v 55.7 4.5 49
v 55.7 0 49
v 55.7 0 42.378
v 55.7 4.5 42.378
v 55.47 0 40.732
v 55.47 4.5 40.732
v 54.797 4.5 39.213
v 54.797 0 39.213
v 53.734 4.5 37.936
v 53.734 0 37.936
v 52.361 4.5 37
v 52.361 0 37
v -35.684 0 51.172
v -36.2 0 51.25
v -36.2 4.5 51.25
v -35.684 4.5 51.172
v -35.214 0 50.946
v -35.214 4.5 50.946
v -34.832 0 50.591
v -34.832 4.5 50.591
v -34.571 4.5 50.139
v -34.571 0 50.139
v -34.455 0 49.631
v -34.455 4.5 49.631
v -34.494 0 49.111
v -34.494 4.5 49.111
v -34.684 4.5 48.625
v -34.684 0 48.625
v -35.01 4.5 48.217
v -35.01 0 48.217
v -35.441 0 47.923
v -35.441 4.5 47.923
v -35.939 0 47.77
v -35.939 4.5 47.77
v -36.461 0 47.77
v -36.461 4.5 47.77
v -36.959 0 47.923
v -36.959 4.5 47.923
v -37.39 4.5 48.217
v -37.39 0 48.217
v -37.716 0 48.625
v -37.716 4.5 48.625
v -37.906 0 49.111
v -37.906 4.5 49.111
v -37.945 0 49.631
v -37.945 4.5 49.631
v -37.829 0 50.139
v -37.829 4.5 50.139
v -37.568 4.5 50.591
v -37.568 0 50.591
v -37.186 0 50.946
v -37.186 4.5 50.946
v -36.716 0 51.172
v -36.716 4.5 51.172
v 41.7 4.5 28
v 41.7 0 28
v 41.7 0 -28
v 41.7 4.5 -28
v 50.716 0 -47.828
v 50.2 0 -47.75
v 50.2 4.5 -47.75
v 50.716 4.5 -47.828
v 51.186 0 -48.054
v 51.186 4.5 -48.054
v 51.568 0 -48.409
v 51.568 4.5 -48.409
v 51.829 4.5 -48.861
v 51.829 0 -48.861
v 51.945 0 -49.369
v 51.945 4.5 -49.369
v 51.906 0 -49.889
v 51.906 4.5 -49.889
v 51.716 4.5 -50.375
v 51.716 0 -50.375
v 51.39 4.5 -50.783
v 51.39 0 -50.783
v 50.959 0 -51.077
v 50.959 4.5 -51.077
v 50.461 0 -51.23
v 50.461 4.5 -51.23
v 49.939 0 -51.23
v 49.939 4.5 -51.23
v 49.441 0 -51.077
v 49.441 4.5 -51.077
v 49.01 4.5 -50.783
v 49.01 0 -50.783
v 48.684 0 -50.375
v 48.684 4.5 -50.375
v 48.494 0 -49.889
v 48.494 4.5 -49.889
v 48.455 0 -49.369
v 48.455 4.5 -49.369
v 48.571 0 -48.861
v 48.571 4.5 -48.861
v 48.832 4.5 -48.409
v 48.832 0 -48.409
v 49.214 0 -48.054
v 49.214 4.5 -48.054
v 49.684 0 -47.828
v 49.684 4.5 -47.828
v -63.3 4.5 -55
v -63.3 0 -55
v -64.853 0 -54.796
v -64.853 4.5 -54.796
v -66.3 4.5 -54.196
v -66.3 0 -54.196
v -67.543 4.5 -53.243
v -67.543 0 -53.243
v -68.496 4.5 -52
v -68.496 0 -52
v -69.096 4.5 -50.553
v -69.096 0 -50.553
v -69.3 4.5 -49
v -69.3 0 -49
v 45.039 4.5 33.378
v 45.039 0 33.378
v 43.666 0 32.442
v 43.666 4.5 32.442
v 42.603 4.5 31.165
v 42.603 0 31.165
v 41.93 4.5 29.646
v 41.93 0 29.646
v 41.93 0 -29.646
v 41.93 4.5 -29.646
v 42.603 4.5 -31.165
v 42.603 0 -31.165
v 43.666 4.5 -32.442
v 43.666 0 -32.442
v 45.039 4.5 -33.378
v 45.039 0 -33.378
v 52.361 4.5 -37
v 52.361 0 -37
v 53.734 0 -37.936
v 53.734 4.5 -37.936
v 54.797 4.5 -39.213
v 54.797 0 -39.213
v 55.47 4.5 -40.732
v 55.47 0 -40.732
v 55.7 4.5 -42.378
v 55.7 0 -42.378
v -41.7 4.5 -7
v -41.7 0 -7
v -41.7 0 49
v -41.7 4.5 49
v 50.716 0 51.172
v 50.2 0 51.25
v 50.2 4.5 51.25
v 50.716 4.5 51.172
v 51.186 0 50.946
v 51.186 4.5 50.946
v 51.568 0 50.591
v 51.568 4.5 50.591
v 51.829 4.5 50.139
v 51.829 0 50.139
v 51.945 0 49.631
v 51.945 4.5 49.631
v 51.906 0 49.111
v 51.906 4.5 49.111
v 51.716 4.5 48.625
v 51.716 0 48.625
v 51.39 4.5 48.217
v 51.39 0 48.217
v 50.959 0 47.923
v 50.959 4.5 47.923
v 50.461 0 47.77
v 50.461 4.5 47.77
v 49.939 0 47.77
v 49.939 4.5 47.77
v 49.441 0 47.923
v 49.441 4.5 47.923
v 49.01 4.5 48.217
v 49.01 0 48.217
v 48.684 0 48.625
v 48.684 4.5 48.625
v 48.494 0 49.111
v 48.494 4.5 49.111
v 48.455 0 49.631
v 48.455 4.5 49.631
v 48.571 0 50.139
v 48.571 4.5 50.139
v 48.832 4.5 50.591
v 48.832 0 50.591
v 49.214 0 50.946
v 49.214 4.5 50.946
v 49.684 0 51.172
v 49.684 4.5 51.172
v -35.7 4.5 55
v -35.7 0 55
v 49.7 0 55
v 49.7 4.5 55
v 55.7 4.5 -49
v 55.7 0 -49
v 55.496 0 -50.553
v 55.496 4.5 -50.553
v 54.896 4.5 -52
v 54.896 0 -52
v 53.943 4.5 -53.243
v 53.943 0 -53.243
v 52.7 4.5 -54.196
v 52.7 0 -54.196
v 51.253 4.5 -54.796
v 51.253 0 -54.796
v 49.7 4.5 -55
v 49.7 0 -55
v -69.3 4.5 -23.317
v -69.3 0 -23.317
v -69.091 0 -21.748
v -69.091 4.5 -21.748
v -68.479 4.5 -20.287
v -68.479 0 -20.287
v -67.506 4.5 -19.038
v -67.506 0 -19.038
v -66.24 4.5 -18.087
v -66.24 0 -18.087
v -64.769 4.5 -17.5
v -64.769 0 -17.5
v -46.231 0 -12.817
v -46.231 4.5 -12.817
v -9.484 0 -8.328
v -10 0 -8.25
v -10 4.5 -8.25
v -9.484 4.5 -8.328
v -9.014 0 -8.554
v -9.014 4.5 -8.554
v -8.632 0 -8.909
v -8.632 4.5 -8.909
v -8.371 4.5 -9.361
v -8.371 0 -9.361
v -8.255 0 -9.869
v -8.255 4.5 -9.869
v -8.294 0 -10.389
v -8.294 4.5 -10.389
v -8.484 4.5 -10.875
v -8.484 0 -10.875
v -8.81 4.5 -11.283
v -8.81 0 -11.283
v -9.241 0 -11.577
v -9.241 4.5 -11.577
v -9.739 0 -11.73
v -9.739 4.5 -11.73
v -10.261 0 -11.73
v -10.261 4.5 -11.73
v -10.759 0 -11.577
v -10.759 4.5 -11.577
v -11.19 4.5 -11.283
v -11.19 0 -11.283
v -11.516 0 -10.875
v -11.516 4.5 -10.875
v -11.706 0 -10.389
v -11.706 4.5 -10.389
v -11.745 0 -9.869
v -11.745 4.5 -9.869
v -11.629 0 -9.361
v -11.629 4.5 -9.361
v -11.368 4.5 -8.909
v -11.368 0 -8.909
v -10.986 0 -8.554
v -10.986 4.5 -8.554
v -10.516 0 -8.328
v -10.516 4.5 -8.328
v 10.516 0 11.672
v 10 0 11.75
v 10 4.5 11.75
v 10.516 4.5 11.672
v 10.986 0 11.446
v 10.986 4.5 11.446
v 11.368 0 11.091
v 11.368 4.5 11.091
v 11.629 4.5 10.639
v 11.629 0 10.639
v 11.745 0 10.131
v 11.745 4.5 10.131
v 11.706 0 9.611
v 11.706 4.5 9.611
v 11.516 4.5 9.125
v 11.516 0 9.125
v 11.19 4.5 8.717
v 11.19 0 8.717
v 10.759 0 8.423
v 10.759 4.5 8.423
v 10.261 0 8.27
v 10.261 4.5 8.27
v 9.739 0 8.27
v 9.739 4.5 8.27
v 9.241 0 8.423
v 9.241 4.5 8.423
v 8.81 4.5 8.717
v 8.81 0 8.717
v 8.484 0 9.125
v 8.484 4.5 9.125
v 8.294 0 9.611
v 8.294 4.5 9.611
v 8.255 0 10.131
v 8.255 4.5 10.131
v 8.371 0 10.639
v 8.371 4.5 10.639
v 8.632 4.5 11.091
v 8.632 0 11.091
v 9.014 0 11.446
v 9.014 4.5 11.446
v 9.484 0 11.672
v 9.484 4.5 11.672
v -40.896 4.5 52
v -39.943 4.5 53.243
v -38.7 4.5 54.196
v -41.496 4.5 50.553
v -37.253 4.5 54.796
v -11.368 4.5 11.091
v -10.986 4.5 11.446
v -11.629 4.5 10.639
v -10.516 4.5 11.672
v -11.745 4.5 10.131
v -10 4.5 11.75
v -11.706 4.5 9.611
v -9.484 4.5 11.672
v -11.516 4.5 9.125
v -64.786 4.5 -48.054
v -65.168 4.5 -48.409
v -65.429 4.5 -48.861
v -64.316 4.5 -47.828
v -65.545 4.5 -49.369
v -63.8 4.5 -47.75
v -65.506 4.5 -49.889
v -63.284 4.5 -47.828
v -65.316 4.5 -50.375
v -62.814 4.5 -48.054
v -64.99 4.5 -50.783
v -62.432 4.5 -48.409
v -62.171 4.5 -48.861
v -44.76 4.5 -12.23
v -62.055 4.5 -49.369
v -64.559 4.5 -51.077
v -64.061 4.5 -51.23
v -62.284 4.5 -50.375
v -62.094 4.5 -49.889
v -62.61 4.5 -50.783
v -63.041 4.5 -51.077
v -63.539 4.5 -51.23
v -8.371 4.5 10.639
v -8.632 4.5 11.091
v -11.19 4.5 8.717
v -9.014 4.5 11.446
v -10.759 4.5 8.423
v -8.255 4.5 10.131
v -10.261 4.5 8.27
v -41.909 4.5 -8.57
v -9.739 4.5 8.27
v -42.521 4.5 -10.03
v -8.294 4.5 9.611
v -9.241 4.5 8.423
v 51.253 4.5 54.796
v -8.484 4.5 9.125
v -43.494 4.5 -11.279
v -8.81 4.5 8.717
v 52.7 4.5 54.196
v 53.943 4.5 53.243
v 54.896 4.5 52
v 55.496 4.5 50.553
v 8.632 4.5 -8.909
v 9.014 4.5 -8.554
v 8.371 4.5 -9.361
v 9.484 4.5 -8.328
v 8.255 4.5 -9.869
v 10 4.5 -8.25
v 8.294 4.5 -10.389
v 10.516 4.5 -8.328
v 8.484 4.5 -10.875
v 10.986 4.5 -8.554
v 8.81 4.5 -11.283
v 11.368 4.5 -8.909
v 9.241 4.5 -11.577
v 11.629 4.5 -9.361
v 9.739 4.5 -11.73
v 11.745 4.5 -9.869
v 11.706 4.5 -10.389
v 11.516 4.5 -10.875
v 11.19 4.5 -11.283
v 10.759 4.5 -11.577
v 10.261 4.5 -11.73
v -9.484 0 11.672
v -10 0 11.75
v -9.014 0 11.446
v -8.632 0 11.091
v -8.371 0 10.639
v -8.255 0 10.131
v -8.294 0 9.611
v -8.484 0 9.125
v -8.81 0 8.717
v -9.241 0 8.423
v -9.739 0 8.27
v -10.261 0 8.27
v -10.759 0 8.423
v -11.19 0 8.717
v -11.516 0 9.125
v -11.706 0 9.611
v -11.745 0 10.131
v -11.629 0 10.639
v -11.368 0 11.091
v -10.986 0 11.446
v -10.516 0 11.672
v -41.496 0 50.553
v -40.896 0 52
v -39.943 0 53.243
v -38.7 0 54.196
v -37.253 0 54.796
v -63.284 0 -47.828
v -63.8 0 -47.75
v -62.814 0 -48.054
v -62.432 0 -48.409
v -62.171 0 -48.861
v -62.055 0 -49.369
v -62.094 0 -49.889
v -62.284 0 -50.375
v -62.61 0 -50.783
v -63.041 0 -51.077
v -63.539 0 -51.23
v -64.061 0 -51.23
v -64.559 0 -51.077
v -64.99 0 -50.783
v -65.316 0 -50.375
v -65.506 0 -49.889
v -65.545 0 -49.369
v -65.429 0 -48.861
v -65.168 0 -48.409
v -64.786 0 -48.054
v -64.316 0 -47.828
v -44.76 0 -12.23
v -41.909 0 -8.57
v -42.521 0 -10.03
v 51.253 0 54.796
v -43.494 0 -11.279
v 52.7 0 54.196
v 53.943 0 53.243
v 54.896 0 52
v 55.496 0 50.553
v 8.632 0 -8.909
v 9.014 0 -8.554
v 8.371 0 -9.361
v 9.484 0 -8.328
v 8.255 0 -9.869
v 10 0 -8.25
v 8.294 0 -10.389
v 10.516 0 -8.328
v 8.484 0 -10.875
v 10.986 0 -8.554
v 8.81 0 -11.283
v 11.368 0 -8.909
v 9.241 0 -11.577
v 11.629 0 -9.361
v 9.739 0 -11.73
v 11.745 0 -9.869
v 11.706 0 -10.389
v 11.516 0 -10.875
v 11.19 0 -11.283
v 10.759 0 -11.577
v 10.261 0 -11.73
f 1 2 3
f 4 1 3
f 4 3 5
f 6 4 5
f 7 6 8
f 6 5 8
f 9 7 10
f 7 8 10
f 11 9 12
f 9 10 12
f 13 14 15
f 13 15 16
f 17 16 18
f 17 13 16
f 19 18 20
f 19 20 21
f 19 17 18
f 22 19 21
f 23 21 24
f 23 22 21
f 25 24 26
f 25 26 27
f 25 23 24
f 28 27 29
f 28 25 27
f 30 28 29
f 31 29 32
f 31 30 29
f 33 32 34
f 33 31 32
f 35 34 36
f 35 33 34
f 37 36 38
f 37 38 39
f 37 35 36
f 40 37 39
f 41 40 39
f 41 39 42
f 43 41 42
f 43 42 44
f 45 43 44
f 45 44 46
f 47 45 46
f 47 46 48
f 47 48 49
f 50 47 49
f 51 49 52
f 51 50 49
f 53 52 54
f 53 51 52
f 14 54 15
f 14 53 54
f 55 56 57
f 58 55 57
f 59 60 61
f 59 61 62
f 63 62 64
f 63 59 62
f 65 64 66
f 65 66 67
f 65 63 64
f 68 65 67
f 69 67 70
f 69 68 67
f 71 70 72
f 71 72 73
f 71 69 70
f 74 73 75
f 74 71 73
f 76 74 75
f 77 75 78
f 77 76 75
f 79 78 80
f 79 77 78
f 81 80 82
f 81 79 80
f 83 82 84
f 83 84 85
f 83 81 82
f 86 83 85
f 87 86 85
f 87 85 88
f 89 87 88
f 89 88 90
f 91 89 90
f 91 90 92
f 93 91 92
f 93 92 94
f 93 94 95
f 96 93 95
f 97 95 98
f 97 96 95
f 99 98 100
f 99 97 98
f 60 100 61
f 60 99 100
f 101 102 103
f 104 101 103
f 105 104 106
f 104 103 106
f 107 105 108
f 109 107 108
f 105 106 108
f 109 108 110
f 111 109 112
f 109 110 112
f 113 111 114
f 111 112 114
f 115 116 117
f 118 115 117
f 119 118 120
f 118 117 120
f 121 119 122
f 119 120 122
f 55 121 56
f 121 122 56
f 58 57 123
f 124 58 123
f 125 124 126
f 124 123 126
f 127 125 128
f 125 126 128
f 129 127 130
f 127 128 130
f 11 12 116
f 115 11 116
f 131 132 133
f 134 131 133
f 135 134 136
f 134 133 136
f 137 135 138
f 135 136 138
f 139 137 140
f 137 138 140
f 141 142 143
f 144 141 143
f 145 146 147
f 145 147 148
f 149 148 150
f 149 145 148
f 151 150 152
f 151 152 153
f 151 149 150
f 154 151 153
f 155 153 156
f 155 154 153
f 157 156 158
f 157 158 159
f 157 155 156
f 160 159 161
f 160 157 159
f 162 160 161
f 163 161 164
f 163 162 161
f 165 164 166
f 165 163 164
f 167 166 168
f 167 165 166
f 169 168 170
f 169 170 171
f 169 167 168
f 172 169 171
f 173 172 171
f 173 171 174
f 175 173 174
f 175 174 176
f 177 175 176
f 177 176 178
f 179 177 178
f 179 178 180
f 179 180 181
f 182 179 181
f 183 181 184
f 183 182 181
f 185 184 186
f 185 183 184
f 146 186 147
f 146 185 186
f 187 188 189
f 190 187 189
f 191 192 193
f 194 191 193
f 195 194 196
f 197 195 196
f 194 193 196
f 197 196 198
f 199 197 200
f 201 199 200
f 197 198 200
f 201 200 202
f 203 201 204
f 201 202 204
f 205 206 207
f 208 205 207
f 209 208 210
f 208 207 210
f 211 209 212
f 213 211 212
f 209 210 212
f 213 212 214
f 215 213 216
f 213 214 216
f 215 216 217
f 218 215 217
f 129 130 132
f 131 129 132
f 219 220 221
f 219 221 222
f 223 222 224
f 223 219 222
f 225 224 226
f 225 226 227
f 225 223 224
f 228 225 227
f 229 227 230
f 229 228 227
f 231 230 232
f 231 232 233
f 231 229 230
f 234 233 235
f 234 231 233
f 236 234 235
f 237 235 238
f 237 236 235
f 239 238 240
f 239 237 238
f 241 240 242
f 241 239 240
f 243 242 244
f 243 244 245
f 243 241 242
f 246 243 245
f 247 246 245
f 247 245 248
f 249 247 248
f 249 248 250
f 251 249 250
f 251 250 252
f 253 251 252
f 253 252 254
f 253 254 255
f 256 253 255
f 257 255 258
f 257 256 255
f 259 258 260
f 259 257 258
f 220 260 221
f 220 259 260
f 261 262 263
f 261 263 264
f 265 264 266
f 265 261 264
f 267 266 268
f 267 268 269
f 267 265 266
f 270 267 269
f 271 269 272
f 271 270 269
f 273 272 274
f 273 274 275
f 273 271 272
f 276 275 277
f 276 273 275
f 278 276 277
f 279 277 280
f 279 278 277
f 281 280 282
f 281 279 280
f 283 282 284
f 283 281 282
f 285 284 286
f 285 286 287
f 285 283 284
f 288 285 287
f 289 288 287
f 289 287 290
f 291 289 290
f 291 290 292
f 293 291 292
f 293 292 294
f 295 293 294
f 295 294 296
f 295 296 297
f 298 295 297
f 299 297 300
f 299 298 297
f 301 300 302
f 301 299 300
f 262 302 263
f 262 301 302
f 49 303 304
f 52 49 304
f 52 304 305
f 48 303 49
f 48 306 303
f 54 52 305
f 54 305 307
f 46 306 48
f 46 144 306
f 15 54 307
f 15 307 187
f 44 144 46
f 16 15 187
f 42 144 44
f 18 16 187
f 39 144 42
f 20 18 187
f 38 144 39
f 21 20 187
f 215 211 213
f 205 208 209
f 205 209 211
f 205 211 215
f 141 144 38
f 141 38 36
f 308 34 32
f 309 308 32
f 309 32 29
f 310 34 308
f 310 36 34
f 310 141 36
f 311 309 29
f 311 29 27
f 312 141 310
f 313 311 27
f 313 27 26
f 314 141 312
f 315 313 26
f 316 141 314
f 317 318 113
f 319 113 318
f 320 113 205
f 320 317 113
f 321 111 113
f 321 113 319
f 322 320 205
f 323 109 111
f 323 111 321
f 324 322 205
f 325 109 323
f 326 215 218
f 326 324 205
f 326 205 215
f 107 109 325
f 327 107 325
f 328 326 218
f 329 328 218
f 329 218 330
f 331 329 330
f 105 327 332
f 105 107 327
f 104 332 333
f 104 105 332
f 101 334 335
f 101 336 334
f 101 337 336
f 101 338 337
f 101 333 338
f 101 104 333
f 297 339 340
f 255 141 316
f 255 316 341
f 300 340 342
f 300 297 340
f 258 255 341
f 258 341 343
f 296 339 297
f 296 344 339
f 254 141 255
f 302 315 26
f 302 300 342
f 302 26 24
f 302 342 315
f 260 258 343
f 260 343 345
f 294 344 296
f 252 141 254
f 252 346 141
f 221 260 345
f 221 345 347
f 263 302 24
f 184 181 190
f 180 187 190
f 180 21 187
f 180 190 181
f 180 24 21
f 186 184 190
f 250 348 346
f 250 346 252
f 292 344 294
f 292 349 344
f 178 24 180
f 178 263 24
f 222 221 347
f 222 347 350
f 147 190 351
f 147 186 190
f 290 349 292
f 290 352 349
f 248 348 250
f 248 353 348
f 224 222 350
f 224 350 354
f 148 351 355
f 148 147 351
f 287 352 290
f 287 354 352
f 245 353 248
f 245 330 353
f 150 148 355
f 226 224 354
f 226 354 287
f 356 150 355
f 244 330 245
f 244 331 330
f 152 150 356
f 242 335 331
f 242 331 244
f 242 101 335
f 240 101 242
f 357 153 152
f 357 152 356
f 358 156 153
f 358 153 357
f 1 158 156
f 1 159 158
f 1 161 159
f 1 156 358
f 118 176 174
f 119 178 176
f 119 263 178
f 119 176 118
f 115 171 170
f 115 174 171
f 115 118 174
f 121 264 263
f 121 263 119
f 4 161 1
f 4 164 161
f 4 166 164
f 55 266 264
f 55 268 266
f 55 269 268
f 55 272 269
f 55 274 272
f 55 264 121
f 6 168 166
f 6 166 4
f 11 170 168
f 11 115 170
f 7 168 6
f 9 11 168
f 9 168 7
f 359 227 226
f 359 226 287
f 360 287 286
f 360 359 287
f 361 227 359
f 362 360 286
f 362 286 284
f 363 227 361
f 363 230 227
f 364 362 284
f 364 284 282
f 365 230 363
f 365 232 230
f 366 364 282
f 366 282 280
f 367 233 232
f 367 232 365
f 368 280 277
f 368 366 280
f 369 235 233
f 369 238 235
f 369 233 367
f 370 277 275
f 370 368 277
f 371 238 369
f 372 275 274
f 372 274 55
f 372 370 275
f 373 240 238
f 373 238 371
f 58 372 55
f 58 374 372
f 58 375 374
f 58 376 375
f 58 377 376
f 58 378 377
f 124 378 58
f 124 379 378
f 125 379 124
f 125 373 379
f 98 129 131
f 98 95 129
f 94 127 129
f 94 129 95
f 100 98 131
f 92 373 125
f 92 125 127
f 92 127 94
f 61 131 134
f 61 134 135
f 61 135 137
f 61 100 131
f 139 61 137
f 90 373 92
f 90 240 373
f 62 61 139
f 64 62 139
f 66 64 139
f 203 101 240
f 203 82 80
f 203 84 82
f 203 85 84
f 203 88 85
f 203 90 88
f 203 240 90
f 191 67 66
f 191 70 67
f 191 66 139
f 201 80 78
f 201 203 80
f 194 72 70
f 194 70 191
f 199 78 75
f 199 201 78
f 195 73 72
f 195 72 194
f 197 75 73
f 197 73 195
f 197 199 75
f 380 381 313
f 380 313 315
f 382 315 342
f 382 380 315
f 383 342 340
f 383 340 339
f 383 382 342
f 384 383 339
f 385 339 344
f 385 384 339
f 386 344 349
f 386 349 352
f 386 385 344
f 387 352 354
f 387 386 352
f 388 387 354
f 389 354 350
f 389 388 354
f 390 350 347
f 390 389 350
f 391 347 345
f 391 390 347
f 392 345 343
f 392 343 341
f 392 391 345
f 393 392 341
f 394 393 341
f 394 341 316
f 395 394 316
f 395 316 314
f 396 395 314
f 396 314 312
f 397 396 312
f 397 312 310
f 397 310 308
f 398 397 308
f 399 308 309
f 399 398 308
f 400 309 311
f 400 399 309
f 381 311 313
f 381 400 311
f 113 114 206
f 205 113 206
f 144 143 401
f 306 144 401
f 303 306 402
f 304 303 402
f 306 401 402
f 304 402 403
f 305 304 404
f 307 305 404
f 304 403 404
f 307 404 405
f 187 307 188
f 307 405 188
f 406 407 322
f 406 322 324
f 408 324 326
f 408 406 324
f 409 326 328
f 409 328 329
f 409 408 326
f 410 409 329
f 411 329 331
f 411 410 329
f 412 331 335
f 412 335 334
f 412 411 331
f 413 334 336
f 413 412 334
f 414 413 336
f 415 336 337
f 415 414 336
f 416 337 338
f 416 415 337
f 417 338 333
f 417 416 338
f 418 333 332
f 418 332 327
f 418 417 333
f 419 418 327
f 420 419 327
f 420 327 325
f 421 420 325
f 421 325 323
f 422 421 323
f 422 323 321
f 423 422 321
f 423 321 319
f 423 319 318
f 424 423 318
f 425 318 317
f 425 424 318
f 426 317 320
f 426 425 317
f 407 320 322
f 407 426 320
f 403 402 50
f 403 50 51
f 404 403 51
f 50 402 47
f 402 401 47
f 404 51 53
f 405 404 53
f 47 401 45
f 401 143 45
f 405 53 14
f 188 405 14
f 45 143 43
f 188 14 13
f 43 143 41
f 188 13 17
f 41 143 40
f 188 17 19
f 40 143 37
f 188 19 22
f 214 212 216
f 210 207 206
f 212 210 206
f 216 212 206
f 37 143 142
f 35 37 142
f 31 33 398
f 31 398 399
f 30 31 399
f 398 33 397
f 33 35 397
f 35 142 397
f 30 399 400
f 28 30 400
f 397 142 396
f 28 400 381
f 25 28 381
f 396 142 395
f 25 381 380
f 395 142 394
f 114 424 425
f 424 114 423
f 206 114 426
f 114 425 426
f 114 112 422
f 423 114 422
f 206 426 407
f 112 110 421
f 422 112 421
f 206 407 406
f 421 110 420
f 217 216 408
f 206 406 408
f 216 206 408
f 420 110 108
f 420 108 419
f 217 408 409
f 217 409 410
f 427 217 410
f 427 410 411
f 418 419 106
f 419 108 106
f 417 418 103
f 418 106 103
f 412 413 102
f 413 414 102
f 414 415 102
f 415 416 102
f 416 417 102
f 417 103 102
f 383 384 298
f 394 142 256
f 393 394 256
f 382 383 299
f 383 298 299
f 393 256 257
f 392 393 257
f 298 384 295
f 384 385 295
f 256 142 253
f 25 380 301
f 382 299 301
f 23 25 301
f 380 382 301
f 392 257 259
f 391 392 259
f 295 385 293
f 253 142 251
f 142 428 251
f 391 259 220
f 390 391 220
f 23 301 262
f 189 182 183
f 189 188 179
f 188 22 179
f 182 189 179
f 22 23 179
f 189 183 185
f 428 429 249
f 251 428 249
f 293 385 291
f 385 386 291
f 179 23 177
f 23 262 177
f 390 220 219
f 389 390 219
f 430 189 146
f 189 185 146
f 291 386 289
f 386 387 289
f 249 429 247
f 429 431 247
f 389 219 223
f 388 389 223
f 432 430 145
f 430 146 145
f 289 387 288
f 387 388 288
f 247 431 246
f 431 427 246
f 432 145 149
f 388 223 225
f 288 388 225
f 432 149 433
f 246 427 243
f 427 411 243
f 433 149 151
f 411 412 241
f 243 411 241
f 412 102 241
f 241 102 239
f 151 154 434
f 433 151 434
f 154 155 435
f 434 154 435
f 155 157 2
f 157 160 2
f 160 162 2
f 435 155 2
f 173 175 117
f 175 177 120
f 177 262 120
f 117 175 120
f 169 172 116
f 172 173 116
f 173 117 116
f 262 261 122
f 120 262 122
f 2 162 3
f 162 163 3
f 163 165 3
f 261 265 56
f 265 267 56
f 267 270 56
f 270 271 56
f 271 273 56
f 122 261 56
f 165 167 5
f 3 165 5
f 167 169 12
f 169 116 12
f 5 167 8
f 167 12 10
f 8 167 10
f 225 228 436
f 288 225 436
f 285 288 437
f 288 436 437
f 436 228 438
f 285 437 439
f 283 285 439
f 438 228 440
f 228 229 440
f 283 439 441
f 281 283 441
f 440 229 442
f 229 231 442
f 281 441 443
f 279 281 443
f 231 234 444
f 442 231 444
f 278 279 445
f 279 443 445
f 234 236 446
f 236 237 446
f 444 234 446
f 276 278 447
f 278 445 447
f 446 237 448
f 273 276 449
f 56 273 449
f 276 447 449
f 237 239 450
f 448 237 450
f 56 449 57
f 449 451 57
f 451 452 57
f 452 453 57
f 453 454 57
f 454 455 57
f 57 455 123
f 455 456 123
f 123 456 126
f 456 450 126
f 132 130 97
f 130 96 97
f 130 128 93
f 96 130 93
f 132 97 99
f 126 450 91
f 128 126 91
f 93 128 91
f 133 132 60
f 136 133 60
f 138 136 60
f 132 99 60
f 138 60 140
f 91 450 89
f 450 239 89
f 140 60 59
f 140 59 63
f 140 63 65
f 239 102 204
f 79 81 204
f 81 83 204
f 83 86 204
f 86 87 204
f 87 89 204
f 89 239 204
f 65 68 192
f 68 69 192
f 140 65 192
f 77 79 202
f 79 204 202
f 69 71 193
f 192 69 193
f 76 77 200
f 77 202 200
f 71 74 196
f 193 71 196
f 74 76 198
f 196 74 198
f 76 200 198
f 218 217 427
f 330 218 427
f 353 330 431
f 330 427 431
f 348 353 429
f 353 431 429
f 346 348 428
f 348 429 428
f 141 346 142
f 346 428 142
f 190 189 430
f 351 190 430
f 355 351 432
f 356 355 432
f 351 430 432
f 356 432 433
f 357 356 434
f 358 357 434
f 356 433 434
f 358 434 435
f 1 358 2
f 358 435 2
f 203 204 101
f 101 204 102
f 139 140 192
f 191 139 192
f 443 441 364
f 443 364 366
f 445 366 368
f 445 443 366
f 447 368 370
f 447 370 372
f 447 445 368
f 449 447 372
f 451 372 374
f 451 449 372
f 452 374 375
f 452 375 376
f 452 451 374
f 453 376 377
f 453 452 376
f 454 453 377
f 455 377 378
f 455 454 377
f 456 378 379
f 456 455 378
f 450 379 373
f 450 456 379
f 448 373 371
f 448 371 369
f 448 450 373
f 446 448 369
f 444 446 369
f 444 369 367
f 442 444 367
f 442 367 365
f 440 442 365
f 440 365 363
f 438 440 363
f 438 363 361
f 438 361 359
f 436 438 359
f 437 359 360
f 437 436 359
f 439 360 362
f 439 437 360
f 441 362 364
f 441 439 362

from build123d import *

# Parameters (mm, degrees)
SKETCH1_R           = 1.75
BOSS_EXTRUDE1_DEPTH = 4.5


with BuildPart() as part:
    # Sketch1 → Boss-Extrude1 (new body)
    with BuildSketch(Plane(origin=(0, 0, 0), x_dir=(1, 0, 0), z_dir=(0, 1, 0))):
        with BuildLine():
            Line((-35.7, -55), (49.7, -55))
            ThreePointArc((49.7, -55), (53.942640687, -53.242640687), (55.7, -49))
            Line((55.7, -49), (55.7, -42.377818725))
            ThreePointArc((55.7, -42.377818725), (54.797249664, -39.212689049), (52.36065138, -37))
            Line((52.36065138, -37), (45.03934862, -33.377818725))
            ThreePointArc((45.03934862, -33.377818725), (42.602750336, -31.165129675), (41.7, -28))
            Line((41.7, -28), (41.7, 28))
            ThreePointArc((41.7, 28), (42.602750336, 31.165129675), (45.03934862, 33.377818725))
            Line((45.03934862, 33.377818725), (52.36065138, 37))
            ThreePointArc((52.36065138, 37), (54.797249664, 39.212689049), (55.7, 42.377818725))
            Line((55.7, 42.377818725), (55.7, 49))
            ThreePointArc((55.7, 49), (53.942640687, 53.242640687), (49.7, 55))
            Line((49.7, 55), (-63.3, 55))
            ThreePointArc((-63.3, 55), (-67.542640687, 53.242640687), (-69.3, 49))
            Line((-69.3, 49), (-69.3, 23.31729281))
            ThreePointArc((-69.3, 23.31729281), (-68.03372658, 19.630582533), (-64.769389112, 17.5))
            Line((-64.769389112, 17.5), (-46.230610888, 12.81729281))
            ThreePointArc((-46.230610888, 12.81729281), (-42.96627342, 10.686710277), (-41.7, 7))
            Line((-41.7, 7), (-41.7, -49))
            ThreePointArc((-41.7, -49), (-39.942640687, -53.242640687), (-35.7, -55))
        make_face()
        with Locations(Location((-63.8, 49.5, 0), (0, 0, 270))):
            Circle(SKETCH1_R, mode=Mode.SUBTRACT)
        with Locations(Location((-36.2, -49.5, 0), (0, 0, 270))):
            Circle(SKETCH1_R, mode=Mode.SUBTRACT)
        with Locations(Location((50.2, -49.5, 0), (0, 0, 270))):
            Circle(SKETCH1_R, mode=Mode.SUBTRACT)
        with Locations(Location((50.2, 49.5, 0), (0, 0, 270))):
            Circle(SKETCH1_R, mode=Mode.SUBTRACT)
        with Locations(Location((-10, 10, 0), (0, 0, 270))):
            Circle(SKETCH1_R, mode=Mode.SUBTRACT)
        with Locations(Location((-10, -10, 0), (0, 0, 270))):
            Circle(SKETCH1_R, mode=Mode.SUBTRACT)
        with Locations(Location((10, -10, 0), (0, 0, 270))):
            Circle(SKETCH1_R, mode=Mode.SUBTRACT)
        with Locations(Location((10, 10, 0), (0, 0, 270))):
            Circle(SKETCH1_R, mode=Mode.SUBTRACT)
    extrude(amount=BOSS_EXTRUDE1_DEPTH)


solid = part.part
